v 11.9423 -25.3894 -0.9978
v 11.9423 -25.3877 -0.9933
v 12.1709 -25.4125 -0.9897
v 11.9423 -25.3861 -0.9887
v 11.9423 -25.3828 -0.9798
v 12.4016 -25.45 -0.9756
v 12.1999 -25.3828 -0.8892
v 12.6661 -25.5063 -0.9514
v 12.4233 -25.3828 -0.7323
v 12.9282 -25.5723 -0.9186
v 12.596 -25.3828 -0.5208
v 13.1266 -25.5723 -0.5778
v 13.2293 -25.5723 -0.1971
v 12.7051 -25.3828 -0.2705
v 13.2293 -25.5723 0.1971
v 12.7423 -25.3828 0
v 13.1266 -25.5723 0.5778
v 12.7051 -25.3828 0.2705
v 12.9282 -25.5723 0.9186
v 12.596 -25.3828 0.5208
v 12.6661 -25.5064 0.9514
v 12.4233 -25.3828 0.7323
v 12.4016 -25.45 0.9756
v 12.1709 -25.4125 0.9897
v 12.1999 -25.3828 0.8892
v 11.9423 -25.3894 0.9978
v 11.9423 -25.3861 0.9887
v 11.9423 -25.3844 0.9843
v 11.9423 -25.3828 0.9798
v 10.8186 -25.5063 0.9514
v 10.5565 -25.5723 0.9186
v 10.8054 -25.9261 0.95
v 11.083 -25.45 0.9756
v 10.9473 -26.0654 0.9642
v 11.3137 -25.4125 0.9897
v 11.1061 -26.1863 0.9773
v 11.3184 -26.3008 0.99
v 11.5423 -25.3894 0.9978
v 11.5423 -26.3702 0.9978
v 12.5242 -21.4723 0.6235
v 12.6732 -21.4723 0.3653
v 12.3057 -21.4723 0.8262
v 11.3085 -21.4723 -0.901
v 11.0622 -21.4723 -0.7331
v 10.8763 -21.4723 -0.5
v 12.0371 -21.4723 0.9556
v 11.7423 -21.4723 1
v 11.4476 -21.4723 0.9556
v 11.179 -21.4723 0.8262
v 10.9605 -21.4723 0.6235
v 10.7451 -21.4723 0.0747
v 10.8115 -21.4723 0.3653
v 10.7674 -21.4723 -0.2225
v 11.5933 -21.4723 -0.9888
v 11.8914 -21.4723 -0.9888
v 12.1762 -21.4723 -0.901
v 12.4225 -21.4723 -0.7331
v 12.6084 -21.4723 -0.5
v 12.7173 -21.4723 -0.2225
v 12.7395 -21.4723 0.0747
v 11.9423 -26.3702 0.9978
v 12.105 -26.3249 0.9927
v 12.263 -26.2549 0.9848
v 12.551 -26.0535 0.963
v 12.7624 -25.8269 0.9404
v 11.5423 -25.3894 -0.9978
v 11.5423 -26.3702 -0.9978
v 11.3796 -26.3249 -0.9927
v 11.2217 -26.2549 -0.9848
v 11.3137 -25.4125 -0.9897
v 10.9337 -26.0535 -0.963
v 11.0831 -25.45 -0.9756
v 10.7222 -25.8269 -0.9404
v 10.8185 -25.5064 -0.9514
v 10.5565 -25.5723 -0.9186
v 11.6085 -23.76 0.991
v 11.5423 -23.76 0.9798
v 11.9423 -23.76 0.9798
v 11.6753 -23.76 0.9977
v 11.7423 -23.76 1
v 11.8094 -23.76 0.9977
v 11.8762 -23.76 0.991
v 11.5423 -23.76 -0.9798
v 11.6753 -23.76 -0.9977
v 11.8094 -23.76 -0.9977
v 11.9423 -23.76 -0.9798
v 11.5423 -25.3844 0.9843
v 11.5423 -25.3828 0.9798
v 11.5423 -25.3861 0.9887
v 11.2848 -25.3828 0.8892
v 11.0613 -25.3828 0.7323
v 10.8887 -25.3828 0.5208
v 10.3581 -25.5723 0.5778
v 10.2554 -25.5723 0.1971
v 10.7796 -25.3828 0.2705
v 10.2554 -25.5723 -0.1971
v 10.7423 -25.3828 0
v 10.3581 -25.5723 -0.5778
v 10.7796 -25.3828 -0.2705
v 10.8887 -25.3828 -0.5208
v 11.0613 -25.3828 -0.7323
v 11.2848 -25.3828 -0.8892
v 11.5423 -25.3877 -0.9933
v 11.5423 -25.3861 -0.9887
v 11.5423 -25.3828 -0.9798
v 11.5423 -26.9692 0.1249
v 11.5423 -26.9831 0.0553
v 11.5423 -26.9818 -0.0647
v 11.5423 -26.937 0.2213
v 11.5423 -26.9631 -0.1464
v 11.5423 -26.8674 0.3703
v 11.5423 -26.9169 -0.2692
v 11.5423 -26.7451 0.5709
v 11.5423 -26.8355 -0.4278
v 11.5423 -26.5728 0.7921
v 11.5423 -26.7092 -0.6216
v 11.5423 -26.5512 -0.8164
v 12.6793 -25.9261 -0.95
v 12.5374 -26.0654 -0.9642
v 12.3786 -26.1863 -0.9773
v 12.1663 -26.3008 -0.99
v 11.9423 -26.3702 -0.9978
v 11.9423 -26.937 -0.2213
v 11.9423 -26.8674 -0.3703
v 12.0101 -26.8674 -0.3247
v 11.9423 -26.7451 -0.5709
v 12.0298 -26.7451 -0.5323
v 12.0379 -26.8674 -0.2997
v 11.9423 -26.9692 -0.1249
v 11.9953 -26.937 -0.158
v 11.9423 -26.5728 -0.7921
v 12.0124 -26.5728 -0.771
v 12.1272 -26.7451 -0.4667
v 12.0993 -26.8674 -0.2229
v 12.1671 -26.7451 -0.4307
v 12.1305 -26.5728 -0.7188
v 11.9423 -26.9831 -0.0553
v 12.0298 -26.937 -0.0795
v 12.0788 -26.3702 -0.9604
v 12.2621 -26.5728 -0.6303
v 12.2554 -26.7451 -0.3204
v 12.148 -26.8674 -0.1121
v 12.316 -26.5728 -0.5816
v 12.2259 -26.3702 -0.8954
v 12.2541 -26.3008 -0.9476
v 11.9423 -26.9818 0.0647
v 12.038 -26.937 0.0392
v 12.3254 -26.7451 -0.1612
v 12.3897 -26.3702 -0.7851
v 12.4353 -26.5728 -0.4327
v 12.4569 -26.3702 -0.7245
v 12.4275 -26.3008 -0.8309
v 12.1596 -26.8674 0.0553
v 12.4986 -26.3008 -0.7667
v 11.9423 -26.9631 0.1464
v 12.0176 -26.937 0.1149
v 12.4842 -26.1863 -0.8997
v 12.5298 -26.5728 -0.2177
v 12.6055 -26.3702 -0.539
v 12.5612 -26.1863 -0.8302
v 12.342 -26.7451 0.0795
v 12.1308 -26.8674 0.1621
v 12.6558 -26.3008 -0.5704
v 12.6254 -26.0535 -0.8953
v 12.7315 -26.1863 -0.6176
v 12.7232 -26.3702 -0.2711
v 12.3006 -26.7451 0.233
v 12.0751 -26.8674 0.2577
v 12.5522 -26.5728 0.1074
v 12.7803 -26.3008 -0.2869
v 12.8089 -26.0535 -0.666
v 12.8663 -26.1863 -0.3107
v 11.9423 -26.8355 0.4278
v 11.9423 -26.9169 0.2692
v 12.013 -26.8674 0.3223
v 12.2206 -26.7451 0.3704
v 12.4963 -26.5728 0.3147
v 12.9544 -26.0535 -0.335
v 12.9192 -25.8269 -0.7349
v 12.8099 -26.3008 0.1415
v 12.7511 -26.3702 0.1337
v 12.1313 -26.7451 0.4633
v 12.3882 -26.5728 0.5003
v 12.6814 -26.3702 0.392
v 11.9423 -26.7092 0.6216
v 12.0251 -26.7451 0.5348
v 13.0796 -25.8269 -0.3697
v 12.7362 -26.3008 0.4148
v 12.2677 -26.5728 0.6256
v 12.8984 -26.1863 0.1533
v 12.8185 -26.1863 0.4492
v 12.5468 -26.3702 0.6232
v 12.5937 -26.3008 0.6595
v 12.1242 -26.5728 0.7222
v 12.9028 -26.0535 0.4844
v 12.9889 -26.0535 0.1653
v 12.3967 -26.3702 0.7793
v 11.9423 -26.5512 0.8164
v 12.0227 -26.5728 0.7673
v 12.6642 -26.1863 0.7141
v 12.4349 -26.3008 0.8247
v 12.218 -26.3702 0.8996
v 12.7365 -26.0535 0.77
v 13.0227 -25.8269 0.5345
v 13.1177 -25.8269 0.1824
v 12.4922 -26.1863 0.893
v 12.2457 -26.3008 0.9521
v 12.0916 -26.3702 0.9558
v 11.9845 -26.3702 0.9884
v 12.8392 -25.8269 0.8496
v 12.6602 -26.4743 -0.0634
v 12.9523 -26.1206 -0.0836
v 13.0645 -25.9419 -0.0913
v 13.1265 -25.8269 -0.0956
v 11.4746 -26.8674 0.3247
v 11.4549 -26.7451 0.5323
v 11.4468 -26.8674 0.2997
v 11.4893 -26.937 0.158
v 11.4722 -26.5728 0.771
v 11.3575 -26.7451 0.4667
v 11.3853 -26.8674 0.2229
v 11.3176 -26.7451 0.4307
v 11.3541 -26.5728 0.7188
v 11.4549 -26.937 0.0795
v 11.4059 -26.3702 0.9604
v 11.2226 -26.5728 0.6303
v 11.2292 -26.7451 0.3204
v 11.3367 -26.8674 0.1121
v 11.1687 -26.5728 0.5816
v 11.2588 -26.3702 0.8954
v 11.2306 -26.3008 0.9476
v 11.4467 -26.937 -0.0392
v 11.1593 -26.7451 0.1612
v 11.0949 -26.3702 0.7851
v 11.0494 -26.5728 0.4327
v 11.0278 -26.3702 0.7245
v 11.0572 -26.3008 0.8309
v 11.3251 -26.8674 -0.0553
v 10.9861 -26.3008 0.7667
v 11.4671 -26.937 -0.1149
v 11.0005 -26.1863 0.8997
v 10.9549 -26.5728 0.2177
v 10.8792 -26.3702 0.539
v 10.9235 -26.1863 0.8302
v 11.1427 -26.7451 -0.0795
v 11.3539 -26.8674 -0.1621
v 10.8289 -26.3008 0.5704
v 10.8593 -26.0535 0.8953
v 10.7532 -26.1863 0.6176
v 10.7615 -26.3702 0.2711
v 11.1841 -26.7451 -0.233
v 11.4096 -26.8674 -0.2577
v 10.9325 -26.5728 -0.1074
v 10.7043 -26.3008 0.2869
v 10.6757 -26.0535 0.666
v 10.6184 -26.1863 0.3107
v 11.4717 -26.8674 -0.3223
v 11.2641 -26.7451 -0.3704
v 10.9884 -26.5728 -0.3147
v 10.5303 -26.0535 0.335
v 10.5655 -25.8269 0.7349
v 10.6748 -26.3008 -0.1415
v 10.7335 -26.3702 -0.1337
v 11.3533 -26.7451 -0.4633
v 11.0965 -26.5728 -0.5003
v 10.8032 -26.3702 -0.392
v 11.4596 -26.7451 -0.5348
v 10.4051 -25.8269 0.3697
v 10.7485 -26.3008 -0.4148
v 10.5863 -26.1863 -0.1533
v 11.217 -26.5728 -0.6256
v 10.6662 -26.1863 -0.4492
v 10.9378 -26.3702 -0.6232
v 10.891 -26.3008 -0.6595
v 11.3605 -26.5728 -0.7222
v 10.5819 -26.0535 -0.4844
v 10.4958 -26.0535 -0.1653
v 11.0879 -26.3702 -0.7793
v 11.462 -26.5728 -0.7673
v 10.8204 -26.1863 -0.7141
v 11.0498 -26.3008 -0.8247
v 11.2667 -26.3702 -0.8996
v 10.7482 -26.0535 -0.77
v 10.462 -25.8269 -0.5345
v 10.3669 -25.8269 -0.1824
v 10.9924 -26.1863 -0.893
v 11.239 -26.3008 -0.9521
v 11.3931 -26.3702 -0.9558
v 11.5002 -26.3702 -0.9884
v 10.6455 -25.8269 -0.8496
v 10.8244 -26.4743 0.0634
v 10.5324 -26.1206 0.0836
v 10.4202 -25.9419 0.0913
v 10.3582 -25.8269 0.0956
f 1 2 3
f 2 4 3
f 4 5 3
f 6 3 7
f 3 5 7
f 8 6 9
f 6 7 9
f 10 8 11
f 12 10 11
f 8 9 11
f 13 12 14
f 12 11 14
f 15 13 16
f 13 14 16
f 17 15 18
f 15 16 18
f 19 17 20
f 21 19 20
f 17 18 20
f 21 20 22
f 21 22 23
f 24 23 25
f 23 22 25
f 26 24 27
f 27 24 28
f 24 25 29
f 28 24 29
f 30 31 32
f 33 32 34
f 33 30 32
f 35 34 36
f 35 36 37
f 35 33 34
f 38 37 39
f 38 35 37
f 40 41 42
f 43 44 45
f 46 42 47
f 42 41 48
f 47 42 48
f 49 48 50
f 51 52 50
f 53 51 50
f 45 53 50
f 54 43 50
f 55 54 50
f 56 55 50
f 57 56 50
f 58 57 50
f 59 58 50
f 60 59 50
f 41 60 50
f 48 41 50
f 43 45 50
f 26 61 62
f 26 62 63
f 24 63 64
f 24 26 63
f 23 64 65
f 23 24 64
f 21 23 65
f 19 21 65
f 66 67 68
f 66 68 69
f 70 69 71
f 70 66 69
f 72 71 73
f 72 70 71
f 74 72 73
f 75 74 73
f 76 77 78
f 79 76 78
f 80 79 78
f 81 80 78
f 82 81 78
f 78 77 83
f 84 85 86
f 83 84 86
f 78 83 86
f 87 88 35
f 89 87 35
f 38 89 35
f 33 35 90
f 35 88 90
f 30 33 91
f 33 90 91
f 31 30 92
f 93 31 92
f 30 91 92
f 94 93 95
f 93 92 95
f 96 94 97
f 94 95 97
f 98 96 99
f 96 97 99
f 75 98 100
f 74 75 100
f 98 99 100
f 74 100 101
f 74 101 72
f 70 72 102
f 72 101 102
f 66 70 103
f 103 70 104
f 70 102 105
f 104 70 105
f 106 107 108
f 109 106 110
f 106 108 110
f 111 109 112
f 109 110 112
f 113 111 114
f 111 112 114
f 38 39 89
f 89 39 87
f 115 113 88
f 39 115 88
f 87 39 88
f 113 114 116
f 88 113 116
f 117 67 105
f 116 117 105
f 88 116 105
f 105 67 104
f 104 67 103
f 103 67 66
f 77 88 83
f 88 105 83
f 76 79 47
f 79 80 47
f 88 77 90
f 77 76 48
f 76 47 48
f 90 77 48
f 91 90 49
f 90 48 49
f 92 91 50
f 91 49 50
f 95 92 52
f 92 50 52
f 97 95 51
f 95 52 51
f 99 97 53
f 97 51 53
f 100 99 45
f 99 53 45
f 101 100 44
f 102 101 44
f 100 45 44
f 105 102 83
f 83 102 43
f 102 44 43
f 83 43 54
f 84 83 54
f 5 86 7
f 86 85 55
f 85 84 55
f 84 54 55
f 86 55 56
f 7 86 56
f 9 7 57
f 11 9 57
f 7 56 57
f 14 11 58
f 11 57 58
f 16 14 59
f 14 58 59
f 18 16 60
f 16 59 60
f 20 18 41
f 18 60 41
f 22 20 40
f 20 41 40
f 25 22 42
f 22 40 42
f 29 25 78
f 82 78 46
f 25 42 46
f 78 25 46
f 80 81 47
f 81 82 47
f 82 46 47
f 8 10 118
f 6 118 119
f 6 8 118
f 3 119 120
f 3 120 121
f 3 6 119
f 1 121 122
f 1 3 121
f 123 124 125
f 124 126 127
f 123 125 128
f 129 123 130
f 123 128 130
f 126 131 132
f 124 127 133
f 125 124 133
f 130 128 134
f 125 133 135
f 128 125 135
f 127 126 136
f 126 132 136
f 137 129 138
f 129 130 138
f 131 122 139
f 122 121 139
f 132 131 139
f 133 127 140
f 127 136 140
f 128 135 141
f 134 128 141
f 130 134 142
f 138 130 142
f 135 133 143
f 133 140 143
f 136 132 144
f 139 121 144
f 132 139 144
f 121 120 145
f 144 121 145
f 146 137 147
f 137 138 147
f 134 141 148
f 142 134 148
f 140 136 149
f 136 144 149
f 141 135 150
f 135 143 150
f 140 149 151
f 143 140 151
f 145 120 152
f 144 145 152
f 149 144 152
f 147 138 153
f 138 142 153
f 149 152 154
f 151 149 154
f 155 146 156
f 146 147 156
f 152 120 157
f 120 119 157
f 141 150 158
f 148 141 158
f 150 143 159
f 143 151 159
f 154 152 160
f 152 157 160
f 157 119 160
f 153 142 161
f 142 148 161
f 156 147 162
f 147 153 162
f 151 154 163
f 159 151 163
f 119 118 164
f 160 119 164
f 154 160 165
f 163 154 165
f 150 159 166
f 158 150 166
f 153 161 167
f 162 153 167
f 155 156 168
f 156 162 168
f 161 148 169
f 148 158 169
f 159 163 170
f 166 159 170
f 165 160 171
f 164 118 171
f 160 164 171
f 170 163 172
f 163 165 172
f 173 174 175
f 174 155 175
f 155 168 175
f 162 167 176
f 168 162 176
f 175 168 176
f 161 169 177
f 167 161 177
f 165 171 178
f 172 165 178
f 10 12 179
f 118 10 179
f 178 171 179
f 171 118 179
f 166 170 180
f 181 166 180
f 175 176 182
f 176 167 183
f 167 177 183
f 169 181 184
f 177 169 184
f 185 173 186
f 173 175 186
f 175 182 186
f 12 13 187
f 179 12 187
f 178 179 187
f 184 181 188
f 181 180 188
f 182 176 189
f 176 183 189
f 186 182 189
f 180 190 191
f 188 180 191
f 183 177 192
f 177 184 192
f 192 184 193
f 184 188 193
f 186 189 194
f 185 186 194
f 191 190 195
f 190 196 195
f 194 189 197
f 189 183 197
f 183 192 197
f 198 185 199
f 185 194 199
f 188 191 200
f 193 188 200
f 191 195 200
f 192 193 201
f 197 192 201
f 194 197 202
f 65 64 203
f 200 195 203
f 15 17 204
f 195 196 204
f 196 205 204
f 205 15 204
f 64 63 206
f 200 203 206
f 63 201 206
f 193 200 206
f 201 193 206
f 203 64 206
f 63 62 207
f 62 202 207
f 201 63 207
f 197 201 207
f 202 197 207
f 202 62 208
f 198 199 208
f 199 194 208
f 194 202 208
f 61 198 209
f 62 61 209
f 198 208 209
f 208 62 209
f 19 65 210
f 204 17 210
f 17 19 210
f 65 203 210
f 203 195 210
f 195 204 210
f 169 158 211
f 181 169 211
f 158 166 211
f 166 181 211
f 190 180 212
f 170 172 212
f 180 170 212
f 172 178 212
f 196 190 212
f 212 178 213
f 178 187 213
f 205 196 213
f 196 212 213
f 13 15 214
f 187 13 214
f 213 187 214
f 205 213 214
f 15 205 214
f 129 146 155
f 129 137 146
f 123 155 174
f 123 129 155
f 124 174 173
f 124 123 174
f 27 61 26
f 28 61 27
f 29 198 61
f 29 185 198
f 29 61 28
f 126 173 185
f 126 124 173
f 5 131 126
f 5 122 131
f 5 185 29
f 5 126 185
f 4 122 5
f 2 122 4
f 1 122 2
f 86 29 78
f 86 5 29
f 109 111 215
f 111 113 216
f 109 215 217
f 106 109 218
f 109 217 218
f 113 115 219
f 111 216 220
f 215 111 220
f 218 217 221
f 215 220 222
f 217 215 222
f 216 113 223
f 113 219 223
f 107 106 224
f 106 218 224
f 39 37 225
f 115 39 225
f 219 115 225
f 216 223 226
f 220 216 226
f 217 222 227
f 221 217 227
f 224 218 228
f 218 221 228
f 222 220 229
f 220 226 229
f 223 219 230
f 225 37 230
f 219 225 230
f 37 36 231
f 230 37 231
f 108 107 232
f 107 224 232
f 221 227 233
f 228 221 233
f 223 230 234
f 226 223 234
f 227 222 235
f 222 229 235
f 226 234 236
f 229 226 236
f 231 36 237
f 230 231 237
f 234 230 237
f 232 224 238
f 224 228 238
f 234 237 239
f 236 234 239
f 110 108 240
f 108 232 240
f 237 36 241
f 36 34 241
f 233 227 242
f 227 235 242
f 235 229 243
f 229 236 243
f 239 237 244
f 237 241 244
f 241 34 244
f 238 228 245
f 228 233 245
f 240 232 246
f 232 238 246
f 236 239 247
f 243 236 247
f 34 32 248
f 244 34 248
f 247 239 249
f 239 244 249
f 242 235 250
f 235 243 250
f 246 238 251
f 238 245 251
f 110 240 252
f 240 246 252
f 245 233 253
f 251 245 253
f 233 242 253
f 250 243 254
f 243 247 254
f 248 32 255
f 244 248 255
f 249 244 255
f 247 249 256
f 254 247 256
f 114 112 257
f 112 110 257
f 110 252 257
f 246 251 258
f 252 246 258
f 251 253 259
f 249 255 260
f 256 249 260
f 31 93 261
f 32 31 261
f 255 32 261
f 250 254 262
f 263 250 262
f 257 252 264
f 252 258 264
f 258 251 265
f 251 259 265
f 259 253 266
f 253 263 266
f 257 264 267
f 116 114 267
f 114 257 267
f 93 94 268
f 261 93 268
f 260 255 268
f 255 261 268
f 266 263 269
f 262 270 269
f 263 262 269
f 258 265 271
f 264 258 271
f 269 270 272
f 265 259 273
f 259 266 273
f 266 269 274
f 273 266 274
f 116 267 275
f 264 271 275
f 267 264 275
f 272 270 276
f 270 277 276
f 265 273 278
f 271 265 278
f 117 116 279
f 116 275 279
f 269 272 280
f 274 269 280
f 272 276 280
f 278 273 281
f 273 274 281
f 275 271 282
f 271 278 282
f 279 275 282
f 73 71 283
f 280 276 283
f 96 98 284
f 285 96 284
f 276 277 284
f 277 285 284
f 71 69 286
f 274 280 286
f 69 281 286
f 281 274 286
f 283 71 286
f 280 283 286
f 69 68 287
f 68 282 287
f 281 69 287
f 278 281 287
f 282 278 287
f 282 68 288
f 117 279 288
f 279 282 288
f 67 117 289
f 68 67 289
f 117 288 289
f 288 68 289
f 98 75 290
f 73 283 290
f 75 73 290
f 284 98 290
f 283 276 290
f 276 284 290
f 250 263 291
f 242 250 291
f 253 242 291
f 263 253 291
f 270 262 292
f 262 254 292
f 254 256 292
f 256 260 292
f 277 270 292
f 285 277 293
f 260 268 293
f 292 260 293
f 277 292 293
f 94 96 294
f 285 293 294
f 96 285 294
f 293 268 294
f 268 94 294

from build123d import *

# Parameters (mm, degrees)
CUT_EXTRUDE1_DEPTH      = 25.4
CUT_EXTRUDE1_DEPTH_BACK = 25.4
SKETCH2_W               = 0.4
SKETCH2_H               = 3.312305011
SKETCH3_RX              = 25.4
SKETCH3_RY              = 25.4
SKETCH3_RX_2            = 3
SKETCH3_RY_2            = 1
CUT_EXTRUDE2_DEPTH      = 50.8


with BuildPart() as part:
    # Sketch1 → Revolve1 (revolve)
    with BuildSketch(Plane.XY):
        with BuildLine():
            Line((11.742340523, -25.572268789), (11.742340523, -27.072268789))
            ThreePointArc((11.742340523, -27.072268789), (12.653410715, -26.483338981), (13.242340523, -25.572268789))
            Line((13.242340523, -25.572268789), (12.742340523, -25.382750908))
            Line((12.742340523, -25.382750908), (12.742340523, -21.472268789))
            Line((12.742340523, -21.472268789), (11.742340523, -21.472268789))
            Line((11.742340523, -21.472268789), (11.742340523, -25.572268789))
        make_face()
    revolve(axis=Axis((11.742340523, -21.472268789, 0), (0, -1, 0)))

    # Sketch2 → Cut-Extrude1 (cut, two sides: drawn at the far end of the back side and taken through both)
    with BuildSketch(Plane.XY.offset(-CUT_EXTRUDE1_DEPTH_BACK)):
        with Locations((11.742340523, -25.416116284)):
            Rectangle(SKETCH2_W, SKETCH2_H)
    extrude(amount=CUT_EXTRUDE1_DEPTH + CUT_EXTRUDE1_DEPTH_BACK, mode=Mode.SUBTRACT)

    # Sketch3 → Cut-Extrude2 (cut)
    with BuildSketch(Plane(origin=(0, 0, 0), x_dir=(1, 0, 0), z_dir=(0, 1, 0))):
        with Locations((11.742340523, 0)):
            Ellipse(SKETCH3_RX, SKETCH3_RY)
        with Locations((11.742340523, 0)):
            Ellipse(SKETCH3_RX_2, SKETCH3_RY_2, mode=Mode.SUBTRACT)
    extrude(amount=-CUT_EXTRUDE2_DEPTH, mode=Mode.SUBTRACT)


solid = part.part
